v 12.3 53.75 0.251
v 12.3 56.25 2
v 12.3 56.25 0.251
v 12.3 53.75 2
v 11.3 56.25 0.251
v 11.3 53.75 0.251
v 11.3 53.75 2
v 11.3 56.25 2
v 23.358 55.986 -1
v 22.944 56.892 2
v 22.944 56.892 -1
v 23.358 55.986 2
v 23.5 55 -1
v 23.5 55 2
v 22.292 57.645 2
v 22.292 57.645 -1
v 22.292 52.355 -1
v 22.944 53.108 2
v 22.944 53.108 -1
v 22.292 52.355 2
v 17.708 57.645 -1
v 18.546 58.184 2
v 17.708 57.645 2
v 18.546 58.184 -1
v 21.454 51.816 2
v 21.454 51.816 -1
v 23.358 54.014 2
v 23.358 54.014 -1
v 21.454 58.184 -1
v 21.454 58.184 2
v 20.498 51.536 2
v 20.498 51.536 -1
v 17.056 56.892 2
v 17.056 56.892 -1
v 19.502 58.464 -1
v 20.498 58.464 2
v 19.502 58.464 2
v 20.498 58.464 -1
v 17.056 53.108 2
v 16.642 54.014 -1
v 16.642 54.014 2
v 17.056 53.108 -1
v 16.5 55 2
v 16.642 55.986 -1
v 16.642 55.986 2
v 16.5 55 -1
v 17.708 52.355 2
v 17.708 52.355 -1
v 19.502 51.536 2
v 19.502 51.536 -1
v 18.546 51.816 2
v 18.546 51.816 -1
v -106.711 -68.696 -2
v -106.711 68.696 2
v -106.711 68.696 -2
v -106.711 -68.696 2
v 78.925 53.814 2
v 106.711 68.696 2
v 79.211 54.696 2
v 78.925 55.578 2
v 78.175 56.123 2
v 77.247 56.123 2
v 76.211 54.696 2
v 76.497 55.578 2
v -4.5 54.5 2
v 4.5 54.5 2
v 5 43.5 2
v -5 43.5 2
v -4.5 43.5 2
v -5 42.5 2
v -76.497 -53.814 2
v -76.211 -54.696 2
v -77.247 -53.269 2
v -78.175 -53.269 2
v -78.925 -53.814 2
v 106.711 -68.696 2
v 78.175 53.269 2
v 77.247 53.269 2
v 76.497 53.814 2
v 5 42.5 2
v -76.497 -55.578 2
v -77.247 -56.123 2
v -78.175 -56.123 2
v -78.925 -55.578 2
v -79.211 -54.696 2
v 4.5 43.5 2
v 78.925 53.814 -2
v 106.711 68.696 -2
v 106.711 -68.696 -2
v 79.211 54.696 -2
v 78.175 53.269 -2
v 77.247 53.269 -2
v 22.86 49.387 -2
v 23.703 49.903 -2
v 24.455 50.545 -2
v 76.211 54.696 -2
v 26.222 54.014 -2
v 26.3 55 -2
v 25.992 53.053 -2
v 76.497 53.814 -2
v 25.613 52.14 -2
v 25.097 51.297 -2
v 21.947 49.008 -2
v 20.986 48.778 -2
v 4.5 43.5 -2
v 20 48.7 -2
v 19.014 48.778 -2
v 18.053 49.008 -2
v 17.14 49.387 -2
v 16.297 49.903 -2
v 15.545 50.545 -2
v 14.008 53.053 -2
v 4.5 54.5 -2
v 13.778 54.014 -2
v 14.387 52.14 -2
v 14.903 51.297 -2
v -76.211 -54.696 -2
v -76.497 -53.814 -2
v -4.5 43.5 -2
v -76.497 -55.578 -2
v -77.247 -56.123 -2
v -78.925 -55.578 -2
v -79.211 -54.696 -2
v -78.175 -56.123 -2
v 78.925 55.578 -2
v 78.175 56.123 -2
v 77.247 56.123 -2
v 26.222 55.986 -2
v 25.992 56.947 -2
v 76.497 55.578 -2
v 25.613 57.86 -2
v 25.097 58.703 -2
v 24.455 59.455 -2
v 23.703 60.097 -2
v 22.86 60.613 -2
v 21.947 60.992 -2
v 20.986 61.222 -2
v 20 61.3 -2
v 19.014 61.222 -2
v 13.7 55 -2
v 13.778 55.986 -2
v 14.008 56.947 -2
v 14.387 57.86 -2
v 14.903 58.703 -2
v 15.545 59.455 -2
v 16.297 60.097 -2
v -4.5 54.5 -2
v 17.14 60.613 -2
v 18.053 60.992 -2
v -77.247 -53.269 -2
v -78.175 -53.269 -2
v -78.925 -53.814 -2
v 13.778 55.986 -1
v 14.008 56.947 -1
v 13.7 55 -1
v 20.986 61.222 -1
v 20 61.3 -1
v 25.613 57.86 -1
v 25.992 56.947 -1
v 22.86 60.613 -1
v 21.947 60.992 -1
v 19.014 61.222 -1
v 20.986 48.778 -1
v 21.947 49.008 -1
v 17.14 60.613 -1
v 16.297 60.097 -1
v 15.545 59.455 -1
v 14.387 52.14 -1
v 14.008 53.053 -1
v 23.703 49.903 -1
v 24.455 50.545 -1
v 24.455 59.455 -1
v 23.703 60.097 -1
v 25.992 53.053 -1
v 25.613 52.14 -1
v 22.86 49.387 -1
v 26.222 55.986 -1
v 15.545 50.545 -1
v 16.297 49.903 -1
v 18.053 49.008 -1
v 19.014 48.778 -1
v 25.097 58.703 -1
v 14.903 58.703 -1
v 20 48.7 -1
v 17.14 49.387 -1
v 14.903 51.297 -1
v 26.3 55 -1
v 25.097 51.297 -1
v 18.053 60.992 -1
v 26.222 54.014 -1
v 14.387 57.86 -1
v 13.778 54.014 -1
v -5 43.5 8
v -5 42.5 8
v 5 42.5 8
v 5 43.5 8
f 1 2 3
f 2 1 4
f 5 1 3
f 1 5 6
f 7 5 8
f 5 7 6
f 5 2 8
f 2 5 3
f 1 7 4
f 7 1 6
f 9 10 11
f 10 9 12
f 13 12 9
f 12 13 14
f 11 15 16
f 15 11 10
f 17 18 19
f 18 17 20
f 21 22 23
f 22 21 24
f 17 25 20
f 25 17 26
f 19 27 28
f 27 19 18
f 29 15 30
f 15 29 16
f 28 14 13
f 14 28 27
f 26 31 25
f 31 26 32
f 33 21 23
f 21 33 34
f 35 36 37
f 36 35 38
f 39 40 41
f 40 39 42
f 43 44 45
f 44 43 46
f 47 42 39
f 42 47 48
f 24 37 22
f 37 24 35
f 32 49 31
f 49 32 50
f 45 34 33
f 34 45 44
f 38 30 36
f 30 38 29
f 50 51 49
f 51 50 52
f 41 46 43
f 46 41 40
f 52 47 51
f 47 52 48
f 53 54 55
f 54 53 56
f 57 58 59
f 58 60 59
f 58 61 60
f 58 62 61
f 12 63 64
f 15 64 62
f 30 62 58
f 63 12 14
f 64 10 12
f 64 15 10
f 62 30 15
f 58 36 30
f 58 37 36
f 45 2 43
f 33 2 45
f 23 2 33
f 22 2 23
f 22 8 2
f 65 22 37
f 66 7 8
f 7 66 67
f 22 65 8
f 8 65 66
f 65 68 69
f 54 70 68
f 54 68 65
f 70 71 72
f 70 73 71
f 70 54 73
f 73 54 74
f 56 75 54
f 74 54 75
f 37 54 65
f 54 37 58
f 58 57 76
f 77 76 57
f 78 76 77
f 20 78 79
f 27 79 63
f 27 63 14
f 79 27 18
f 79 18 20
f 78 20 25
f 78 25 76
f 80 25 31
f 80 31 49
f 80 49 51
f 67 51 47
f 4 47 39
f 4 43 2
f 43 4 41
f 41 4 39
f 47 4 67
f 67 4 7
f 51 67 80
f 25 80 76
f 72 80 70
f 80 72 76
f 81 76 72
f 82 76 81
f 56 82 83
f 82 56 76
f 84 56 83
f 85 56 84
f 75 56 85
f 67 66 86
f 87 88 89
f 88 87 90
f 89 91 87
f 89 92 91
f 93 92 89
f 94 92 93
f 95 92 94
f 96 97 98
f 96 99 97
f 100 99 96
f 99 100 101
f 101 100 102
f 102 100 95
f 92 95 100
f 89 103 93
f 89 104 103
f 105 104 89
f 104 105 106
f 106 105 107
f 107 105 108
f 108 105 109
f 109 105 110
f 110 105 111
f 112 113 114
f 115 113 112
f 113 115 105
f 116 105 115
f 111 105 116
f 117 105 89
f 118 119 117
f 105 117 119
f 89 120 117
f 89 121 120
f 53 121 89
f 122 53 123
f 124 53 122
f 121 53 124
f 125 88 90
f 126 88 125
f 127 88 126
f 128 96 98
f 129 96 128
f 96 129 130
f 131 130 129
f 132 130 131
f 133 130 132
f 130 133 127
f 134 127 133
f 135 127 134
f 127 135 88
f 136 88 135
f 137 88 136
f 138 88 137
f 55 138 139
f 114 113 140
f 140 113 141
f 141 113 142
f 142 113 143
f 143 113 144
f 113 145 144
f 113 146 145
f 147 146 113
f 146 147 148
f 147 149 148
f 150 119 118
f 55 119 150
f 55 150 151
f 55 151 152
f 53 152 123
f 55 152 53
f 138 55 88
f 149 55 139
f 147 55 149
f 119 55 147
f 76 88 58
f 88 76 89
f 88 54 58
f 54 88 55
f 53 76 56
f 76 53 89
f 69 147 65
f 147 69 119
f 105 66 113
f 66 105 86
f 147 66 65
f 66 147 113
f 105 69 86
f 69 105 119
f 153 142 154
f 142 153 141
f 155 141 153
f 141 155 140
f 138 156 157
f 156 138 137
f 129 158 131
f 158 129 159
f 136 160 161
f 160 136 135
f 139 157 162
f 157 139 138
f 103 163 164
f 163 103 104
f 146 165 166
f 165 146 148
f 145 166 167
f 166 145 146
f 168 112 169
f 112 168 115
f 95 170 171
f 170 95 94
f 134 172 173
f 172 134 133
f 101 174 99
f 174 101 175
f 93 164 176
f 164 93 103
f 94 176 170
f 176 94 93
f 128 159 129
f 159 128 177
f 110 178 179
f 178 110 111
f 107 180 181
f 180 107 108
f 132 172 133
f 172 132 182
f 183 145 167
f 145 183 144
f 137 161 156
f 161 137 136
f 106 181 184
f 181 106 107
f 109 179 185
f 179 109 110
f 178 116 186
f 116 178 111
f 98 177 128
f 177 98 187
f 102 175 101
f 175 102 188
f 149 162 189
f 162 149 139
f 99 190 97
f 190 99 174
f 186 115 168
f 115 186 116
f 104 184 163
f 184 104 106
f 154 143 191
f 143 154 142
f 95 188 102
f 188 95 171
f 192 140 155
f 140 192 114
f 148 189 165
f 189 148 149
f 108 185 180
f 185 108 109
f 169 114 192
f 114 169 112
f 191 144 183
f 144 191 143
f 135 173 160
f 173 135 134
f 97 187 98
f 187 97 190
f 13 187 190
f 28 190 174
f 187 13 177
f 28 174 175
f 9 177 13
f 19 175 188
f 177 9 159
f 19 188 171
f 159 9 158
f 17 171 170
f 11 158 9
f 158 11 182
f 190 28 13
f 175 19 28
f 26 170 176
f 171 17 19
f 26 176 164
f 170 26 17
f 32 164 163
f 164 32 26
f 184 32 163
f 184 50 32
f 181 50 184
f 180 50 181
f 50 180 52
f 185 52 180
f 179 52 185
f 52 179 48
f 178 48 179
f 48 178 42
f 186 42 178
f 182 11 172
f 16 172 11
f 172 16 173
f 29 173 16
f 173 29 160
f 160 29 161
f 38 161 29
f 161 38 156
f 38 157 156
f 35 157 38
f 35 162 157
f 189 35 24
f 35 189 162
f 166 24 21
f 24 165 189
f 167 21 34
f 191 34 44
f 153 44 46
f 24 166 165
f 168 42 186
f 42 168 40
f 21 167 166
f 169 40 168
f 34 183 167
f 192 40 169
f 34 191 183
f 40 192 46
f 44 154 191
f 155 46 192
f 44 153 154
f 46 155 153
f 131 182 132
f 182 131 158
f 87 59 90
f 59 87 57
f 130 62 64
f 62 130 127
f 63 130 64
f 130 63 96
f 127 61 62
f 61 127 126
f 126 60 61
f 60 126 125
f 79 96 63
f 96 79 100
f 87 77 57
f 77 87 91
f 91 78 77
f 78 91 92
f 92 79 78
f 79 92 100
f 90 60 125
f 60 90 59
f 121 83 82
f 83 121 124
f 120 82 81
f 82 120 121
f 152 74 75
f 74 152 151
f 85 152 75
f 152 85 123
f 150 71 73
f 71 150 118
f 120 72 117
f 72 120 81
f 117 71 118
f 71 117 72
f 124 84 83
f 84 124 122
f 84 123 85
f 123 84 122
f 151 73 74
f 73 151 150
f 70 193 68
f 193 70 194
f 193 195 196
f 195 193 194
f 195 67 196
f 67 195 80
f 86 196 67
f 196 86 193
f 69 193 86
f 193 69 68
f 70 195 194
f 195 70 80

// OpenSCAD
// file: ../pills/m3_insert.scad
module m3_insert() {
    translate([0, 0, -3.82/2])
        difference() {
            cylinder(h=3.82, r=2.5, center=true);
            cylinder(h = 4, r = 1.5, center=true);
        }
}

m3_insert();
// file: ../pills/electronics.scad
use <dimensions.scad>

hole_inset = 3.5;
module electronics() {
    translate([0, 0, -electronics_thickness()/2-3])
    difference() {
        cube([electronics_width(), electronics_height(), electronics_thickness()], center=true);
        translate([-electronics_width()/2 + hole_inset, 0, 0])
        cylinder(h=electronics_thickness()*2, r=1.5, center=true);
    }
}

electronics();
// file: ../pills/negative_insert.scad
use <m3_insert.scad>

module negative_insert() {
    $fs=1;
    $fa=0.4;

    translate([0, 0, 3.82])
    union() {
        translate([0, 0, -(3.82/2)])
        cylinder(h=3.82, r=2.5, center=true);
        translate([0, 0, -0.001])
        linear_extrude(height=3, scale=0.7)
        circle(r=2.5);
    }
}

negative_insert();
// file: ../pills/negative_screw.scad
use <dimensions.scad>

thickness = 3;
module negative_screw() {
    translate([-plate_width()/2 + hole_offset(), -plate_height()/2 + hole_offset(), 0])
        cylinder(h = thickness * 2, r = hole_radius(), center=true);
    translate([plate_width()/2 - hole_offset(), -plate_height()/2 + hole_offset(), 0])
        cylinder(h = thickness * 2, r = hole_radius(), center=true);
    translate([plate_width()/2 - hole_offset(), plate_height()/2 - hole_offset(), 0])
        cylinder(h = thickness * 2, r = hole_radius(), center=true);
    translate([-plate_width()/2 + hole_offset(), plate_height()/2 - hole_offset(), 0])
        cylinder(h = thickness * 2, r = hole_radius(), center=true);
}

negative_screw();
// file: ../pills/power_connector.scad
$fs=1;
$fa=0.4;

width = 9.2;
height = 11;
depth = 14.5;

barrel_radius = 4.1;
barrel_top_offset = 0.5;

plate_thickness = 3.5;

bottom_depth = 14.5;

module power_connector() {
    difference() {
        translate([-plate_thickness/2, 0, -height/2])
            cube([plate_thickness, width, height], center=true);
        translate([-plate_thickness/2, -width/2+1.5/2-0.001, -1.5/2+0.001])
            cube([1.4, 1.5, 1.5], center=true);
        translate([-plate_thickness/2, +width/2-1.5/2+0.001, -1.5/2+0.002])
            cube([1.4, 1.5, 1.5], center=true);
    }
    translate([(depth-plate_thickness)/2-0.001, 0, -barrel_radius-barrel_top_offset])
        rotate([0, 90, 0])
        cylinder(h=depth-plate_thickness, r=barrel_radius, center=true);
    translate([bottom_depth/2-plate_thickness, 0, -height/2-(height-6.5)/2])
        cube([bottom_depth, width, 6.5], center=true);
    translate([bottom_depth/2-0.25, 0, -height/2-(height-6.5)/2-5])
        cube([8, width, 6], center=true);
}

power_connector();
// file: back_plate.scad
use <../pills/dimensions.scad>
use <../pills/negative_screw.scad>
use <../pills/negative_insert.scad>
use <../pills/electronics.scad>
use <../pills/power_connector.scad>
use <../pills/switch_pot.scad>

$fs=1;
$fa=0.4;

thickness=4;
support_length=electronics_thickness()+2;
elec_offset_x = -45;
elec_offset_y = 19;
elec_offset_z = 0;

back_plate_width = plate_width() + 12;
back_plate_height = plate_height() + 12;

mounting_length = electronics_width() * 1.25-4;
mounting_width = 20;
mounting_inset = 15;

module back_plate() {
    translate([0, 0, -thickness/2])
    difference() {
        union() {
            translate([-electronics_width()/2+elec_offset_x+3.5, 19, -thickness/2-1.5+0.001])
                cube([10, 10, 3], center=true);
            difference() {
                cube([back_plate_width, back_plate_height, thickness], center=true);
                scale([1, 1, 3])
                    negative_screw();
                translate([
                        (plate_width() + led_height() * 2)/2, (plate_height() + led_height() * 2)/2 + 1.5, 0])
                    cube([
                        thickness*3, thickness*3, thickness*3
                    ], center=true);
                translate([
                        -(plate_width() + led_height() * 2)/2, -(plate_height() + led_height() * 2)/2 - 1.5, 0])
                    cube([
                        thickness*3, thickness*3, thickness*3
                    ], center=true);
            }
        }
        translate([-electronics_width()/2+elec_offset_x+3.5, 19, -thickness])
            translate([0, 0, -1])
            negative_insert();
    }
    difference() {
        translate([-back_plate_width/2+mounting_length/2+mounting_inset, back_plate_height/2-mounting_width/2, -thickness-support_length/2])
            cube([mounting_length, mounting_width, support_length], center=true);
        translate([0, 55, -support_length-1.501])
            rotate([0, 270, 270])
            power_connector();
        translate([-20, 55, -support_length -4.001])// -29.001])
            rotate([180, 0, 180])
            switch_pot();
        translate([-52, 55, -support_length])
            cube([40, 30, 50], center=true);
        translate([-back_plate_width/2+10+mounting_inset, back_plate_height/2 - mounting_width/2, -support_length-thickness-0.001])
            negative_insert();
    }
    difference() {
        translate([back_plate_width/2-10-mounting_inset, -back_plate_height/2 + mounting_width/2, -thickness-support_length/2])
            cube([10, 10, support_length], center=true);
        translate([back_plate_width/2-10-mounting_inset,-back_plate_height/2 + mounting_width/2, -support_length-thickness-0.001])
            negative_insert();
    }
}

scale([-1, 1, 1])
back_plate();

// color([1, 0, 0, 0.3])
// translate([elec_offset_x, elec_offset_y, elec_offset_z])
// electronics();
// file: ../pills/negative_power_connector.scad
use <power_connector.scad>

thickness=4;
width = 9;
height = 11;
module negative_power_connector() {
    cube([width, height, thickness], center=true);
}

negative_power_connector();
// file: ../pills/switch_pot.scad
base_radius = 17.4/2;
base_width = 15.3;
thickness = 11.2;
pin_sides = 2.5;
pin_thickness = 1;
shaft_radius= 7/2;
shaft_height=15;
thread_height=6.5;

$fs=1;
$fa=0.4;
module switch_pot() {
    translate([0, 0, -thickness/2])
        cylinder(h=thickness, r=base_radius, center=true);
    translate([-base_radius+pin_thickness/2, 0, pin_thickness/2])
        cube([pin_thickness, pin_sides, pin_sides], center=true);
    translate([0, -base_width/2, -thickness/2])
        cube([base_width, base_width/2, thickness], center=true);
    translate([0, 0, shaft_height/2])
        cylinder(h=shaft_height, r=shaft_radius, center=true);
}

switch_pot();
// file: ../pills/dimensions.scad
function plate_width() = 193.422;
function plate_height() = 117.392;
function plate_thickness() = 3;
function separation() = 5;
function led_width() = 10;
function led_height() = 2.5;
function hole_radius() = 1.5;
function hole_offset() = 3.5 + hole_radius();
function separator_thickness() = (led_width()-plate_thickness())/2;

function electronics_width() = 81.3;
function electronics_height() = 50.7;
function electronics_thickness() = 23;
// main file
use <../pills/dimensions.scad>
use <../pills/switch_pot.scad>
use <../pills/negative_power_connector.scad>
use <back_plate.scad>

back_cover_width = plate_width() + 20;
back_cover_height = plate_height() + 20;
back_plate_width = plate_width() + 12;
back_plate_height = plate_height() + 12;
thickness = 4;
mounting_width = 20;
mounting_inset = 15;

$fs=1;
$fa=0.4;

cover_length=6;

module back_cover() {
    difference() {
        cube([back_cover_width, back_cover_height, thickness], center=true);
        translate([0, 49, 0])
            scale([1, 1, 2])
            negative_power_connector();
        translate([-20, 55, 2.001])// -29.001])
            rotate([180, 0, 180])
            switch_pot();
        translate([-20, 55, -2])
            cylinder(r=6.3, h=2, center=true);
        translate([-back_plate_width/2+10+mounting_inset, back_plate_height/2 - mounting_width/2, 0])
            cylinder(h=thickness*2, r=1.5, center=true);
        translate([back_plate_width/2-10-mounting_inset,-back_plate_height/2 + mounting_width/2, 0])
            cylinder(h=thickness*2, r=1.5, center=true);
    }
        translate([0, 43, cover_length/2+thickness/2])
            cube([10, 1, cover_length], center=true);
}

scale([-1, 1, 1])
back_cover();
